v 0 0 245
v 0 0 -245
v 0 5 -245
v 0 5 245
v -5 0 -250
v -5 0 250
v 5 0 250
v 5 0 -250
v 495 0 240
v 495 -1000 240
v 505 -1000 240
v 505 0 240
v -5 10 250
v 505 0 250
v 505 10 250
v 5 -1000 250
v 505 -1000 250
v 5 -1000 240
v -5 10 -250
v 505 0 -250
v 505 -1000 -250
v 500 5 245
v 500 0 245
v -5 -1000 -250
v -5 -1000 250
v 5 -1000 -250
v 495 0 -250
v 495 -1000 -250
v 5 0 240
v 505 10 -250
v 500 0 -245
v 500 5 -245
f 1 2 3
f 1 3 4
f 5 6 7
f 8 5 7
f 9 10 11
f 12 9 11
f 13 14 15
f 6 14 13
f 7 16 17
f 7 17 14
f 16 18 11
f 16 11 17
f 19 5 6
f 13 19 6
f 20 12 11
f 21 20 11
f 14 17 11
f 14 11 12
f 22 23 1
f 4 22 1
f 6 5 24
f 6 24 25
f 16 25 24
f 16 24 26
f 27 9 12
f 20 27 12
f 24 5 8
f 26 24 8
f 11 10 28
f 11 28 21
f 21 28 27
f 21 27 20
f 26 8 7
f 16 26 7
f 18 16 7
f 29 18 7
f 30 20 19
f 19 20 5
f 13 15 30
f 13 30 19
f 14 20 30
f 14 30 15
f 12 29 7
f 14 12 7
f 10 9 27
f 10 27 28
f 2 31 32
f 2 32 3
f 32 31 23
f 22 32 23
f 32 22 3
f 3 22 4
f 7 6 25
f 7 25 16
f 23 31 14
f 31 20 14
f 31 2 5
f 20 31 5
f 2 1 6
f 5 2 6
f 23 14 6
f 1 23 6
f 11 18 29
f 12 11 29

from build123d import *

# Parameters (mm, degrees)
F0_W     = 10
F0_H     = 500
F1_DEPTH = 1000
F2_W     = 1000
F2_H     = 10
F3_DEPTH = 500
F4_W     = 10
F4_H     = 1000
F5_DEPTH = 490
F6_W     = 510
F6_H     = 500
F7_DEPTH = 10
F8_T     = -5


with BuildPart() as f1:
    # F0 (on Front) → F1 (new body)
    with BuildSketch(Plane.XZ):
        Rectangle(F0_W, F0_H)
    extrude(amount=F1_DEPTH)


with BuildPart() as f3:
    # F2 (on face) → F3 (new body)
    with BuildSketch(Plane.YZ.offset(5)):
        with Locations((-500, 245)):
            Rectangle(F2_W, F2_H)
    extrude(amount=F3_DEPTH)


with BuildPart() as f5:
    # F4 (on face) → F5 (new body)
    with BuildSketch(Plane(origin=(0, 0, 240), x_dir=(1, 0, 0), z_dir=(0, 0, -1))):
        with Locations((500, 500)):
            Rectangle(F4_W, F4_H)
    extrude(amount=F5_DEPTH)


with BuildPart() as f7:
    # F6 (on face) → F7 (new body)
    with BuildSketch(Plane(origin=(0, 0, 0), x_dir=(-1, 0, 0), z_dir=(0, 1, 0))):
        with Locations((-250, 0)):
            Rectangle(F6_W, F6_H)
    extrude(amount=F7_DEPTH)

    # F8
    f8_openings = [f7.faces().sort_by_distance(p)[0] for p in [
        (250, 0, 0),
    ]]
    offset(amount=F8_T, openings=f8_openings)


solid = Compound([f1.part, f3.part, f5.part, f7.part])
